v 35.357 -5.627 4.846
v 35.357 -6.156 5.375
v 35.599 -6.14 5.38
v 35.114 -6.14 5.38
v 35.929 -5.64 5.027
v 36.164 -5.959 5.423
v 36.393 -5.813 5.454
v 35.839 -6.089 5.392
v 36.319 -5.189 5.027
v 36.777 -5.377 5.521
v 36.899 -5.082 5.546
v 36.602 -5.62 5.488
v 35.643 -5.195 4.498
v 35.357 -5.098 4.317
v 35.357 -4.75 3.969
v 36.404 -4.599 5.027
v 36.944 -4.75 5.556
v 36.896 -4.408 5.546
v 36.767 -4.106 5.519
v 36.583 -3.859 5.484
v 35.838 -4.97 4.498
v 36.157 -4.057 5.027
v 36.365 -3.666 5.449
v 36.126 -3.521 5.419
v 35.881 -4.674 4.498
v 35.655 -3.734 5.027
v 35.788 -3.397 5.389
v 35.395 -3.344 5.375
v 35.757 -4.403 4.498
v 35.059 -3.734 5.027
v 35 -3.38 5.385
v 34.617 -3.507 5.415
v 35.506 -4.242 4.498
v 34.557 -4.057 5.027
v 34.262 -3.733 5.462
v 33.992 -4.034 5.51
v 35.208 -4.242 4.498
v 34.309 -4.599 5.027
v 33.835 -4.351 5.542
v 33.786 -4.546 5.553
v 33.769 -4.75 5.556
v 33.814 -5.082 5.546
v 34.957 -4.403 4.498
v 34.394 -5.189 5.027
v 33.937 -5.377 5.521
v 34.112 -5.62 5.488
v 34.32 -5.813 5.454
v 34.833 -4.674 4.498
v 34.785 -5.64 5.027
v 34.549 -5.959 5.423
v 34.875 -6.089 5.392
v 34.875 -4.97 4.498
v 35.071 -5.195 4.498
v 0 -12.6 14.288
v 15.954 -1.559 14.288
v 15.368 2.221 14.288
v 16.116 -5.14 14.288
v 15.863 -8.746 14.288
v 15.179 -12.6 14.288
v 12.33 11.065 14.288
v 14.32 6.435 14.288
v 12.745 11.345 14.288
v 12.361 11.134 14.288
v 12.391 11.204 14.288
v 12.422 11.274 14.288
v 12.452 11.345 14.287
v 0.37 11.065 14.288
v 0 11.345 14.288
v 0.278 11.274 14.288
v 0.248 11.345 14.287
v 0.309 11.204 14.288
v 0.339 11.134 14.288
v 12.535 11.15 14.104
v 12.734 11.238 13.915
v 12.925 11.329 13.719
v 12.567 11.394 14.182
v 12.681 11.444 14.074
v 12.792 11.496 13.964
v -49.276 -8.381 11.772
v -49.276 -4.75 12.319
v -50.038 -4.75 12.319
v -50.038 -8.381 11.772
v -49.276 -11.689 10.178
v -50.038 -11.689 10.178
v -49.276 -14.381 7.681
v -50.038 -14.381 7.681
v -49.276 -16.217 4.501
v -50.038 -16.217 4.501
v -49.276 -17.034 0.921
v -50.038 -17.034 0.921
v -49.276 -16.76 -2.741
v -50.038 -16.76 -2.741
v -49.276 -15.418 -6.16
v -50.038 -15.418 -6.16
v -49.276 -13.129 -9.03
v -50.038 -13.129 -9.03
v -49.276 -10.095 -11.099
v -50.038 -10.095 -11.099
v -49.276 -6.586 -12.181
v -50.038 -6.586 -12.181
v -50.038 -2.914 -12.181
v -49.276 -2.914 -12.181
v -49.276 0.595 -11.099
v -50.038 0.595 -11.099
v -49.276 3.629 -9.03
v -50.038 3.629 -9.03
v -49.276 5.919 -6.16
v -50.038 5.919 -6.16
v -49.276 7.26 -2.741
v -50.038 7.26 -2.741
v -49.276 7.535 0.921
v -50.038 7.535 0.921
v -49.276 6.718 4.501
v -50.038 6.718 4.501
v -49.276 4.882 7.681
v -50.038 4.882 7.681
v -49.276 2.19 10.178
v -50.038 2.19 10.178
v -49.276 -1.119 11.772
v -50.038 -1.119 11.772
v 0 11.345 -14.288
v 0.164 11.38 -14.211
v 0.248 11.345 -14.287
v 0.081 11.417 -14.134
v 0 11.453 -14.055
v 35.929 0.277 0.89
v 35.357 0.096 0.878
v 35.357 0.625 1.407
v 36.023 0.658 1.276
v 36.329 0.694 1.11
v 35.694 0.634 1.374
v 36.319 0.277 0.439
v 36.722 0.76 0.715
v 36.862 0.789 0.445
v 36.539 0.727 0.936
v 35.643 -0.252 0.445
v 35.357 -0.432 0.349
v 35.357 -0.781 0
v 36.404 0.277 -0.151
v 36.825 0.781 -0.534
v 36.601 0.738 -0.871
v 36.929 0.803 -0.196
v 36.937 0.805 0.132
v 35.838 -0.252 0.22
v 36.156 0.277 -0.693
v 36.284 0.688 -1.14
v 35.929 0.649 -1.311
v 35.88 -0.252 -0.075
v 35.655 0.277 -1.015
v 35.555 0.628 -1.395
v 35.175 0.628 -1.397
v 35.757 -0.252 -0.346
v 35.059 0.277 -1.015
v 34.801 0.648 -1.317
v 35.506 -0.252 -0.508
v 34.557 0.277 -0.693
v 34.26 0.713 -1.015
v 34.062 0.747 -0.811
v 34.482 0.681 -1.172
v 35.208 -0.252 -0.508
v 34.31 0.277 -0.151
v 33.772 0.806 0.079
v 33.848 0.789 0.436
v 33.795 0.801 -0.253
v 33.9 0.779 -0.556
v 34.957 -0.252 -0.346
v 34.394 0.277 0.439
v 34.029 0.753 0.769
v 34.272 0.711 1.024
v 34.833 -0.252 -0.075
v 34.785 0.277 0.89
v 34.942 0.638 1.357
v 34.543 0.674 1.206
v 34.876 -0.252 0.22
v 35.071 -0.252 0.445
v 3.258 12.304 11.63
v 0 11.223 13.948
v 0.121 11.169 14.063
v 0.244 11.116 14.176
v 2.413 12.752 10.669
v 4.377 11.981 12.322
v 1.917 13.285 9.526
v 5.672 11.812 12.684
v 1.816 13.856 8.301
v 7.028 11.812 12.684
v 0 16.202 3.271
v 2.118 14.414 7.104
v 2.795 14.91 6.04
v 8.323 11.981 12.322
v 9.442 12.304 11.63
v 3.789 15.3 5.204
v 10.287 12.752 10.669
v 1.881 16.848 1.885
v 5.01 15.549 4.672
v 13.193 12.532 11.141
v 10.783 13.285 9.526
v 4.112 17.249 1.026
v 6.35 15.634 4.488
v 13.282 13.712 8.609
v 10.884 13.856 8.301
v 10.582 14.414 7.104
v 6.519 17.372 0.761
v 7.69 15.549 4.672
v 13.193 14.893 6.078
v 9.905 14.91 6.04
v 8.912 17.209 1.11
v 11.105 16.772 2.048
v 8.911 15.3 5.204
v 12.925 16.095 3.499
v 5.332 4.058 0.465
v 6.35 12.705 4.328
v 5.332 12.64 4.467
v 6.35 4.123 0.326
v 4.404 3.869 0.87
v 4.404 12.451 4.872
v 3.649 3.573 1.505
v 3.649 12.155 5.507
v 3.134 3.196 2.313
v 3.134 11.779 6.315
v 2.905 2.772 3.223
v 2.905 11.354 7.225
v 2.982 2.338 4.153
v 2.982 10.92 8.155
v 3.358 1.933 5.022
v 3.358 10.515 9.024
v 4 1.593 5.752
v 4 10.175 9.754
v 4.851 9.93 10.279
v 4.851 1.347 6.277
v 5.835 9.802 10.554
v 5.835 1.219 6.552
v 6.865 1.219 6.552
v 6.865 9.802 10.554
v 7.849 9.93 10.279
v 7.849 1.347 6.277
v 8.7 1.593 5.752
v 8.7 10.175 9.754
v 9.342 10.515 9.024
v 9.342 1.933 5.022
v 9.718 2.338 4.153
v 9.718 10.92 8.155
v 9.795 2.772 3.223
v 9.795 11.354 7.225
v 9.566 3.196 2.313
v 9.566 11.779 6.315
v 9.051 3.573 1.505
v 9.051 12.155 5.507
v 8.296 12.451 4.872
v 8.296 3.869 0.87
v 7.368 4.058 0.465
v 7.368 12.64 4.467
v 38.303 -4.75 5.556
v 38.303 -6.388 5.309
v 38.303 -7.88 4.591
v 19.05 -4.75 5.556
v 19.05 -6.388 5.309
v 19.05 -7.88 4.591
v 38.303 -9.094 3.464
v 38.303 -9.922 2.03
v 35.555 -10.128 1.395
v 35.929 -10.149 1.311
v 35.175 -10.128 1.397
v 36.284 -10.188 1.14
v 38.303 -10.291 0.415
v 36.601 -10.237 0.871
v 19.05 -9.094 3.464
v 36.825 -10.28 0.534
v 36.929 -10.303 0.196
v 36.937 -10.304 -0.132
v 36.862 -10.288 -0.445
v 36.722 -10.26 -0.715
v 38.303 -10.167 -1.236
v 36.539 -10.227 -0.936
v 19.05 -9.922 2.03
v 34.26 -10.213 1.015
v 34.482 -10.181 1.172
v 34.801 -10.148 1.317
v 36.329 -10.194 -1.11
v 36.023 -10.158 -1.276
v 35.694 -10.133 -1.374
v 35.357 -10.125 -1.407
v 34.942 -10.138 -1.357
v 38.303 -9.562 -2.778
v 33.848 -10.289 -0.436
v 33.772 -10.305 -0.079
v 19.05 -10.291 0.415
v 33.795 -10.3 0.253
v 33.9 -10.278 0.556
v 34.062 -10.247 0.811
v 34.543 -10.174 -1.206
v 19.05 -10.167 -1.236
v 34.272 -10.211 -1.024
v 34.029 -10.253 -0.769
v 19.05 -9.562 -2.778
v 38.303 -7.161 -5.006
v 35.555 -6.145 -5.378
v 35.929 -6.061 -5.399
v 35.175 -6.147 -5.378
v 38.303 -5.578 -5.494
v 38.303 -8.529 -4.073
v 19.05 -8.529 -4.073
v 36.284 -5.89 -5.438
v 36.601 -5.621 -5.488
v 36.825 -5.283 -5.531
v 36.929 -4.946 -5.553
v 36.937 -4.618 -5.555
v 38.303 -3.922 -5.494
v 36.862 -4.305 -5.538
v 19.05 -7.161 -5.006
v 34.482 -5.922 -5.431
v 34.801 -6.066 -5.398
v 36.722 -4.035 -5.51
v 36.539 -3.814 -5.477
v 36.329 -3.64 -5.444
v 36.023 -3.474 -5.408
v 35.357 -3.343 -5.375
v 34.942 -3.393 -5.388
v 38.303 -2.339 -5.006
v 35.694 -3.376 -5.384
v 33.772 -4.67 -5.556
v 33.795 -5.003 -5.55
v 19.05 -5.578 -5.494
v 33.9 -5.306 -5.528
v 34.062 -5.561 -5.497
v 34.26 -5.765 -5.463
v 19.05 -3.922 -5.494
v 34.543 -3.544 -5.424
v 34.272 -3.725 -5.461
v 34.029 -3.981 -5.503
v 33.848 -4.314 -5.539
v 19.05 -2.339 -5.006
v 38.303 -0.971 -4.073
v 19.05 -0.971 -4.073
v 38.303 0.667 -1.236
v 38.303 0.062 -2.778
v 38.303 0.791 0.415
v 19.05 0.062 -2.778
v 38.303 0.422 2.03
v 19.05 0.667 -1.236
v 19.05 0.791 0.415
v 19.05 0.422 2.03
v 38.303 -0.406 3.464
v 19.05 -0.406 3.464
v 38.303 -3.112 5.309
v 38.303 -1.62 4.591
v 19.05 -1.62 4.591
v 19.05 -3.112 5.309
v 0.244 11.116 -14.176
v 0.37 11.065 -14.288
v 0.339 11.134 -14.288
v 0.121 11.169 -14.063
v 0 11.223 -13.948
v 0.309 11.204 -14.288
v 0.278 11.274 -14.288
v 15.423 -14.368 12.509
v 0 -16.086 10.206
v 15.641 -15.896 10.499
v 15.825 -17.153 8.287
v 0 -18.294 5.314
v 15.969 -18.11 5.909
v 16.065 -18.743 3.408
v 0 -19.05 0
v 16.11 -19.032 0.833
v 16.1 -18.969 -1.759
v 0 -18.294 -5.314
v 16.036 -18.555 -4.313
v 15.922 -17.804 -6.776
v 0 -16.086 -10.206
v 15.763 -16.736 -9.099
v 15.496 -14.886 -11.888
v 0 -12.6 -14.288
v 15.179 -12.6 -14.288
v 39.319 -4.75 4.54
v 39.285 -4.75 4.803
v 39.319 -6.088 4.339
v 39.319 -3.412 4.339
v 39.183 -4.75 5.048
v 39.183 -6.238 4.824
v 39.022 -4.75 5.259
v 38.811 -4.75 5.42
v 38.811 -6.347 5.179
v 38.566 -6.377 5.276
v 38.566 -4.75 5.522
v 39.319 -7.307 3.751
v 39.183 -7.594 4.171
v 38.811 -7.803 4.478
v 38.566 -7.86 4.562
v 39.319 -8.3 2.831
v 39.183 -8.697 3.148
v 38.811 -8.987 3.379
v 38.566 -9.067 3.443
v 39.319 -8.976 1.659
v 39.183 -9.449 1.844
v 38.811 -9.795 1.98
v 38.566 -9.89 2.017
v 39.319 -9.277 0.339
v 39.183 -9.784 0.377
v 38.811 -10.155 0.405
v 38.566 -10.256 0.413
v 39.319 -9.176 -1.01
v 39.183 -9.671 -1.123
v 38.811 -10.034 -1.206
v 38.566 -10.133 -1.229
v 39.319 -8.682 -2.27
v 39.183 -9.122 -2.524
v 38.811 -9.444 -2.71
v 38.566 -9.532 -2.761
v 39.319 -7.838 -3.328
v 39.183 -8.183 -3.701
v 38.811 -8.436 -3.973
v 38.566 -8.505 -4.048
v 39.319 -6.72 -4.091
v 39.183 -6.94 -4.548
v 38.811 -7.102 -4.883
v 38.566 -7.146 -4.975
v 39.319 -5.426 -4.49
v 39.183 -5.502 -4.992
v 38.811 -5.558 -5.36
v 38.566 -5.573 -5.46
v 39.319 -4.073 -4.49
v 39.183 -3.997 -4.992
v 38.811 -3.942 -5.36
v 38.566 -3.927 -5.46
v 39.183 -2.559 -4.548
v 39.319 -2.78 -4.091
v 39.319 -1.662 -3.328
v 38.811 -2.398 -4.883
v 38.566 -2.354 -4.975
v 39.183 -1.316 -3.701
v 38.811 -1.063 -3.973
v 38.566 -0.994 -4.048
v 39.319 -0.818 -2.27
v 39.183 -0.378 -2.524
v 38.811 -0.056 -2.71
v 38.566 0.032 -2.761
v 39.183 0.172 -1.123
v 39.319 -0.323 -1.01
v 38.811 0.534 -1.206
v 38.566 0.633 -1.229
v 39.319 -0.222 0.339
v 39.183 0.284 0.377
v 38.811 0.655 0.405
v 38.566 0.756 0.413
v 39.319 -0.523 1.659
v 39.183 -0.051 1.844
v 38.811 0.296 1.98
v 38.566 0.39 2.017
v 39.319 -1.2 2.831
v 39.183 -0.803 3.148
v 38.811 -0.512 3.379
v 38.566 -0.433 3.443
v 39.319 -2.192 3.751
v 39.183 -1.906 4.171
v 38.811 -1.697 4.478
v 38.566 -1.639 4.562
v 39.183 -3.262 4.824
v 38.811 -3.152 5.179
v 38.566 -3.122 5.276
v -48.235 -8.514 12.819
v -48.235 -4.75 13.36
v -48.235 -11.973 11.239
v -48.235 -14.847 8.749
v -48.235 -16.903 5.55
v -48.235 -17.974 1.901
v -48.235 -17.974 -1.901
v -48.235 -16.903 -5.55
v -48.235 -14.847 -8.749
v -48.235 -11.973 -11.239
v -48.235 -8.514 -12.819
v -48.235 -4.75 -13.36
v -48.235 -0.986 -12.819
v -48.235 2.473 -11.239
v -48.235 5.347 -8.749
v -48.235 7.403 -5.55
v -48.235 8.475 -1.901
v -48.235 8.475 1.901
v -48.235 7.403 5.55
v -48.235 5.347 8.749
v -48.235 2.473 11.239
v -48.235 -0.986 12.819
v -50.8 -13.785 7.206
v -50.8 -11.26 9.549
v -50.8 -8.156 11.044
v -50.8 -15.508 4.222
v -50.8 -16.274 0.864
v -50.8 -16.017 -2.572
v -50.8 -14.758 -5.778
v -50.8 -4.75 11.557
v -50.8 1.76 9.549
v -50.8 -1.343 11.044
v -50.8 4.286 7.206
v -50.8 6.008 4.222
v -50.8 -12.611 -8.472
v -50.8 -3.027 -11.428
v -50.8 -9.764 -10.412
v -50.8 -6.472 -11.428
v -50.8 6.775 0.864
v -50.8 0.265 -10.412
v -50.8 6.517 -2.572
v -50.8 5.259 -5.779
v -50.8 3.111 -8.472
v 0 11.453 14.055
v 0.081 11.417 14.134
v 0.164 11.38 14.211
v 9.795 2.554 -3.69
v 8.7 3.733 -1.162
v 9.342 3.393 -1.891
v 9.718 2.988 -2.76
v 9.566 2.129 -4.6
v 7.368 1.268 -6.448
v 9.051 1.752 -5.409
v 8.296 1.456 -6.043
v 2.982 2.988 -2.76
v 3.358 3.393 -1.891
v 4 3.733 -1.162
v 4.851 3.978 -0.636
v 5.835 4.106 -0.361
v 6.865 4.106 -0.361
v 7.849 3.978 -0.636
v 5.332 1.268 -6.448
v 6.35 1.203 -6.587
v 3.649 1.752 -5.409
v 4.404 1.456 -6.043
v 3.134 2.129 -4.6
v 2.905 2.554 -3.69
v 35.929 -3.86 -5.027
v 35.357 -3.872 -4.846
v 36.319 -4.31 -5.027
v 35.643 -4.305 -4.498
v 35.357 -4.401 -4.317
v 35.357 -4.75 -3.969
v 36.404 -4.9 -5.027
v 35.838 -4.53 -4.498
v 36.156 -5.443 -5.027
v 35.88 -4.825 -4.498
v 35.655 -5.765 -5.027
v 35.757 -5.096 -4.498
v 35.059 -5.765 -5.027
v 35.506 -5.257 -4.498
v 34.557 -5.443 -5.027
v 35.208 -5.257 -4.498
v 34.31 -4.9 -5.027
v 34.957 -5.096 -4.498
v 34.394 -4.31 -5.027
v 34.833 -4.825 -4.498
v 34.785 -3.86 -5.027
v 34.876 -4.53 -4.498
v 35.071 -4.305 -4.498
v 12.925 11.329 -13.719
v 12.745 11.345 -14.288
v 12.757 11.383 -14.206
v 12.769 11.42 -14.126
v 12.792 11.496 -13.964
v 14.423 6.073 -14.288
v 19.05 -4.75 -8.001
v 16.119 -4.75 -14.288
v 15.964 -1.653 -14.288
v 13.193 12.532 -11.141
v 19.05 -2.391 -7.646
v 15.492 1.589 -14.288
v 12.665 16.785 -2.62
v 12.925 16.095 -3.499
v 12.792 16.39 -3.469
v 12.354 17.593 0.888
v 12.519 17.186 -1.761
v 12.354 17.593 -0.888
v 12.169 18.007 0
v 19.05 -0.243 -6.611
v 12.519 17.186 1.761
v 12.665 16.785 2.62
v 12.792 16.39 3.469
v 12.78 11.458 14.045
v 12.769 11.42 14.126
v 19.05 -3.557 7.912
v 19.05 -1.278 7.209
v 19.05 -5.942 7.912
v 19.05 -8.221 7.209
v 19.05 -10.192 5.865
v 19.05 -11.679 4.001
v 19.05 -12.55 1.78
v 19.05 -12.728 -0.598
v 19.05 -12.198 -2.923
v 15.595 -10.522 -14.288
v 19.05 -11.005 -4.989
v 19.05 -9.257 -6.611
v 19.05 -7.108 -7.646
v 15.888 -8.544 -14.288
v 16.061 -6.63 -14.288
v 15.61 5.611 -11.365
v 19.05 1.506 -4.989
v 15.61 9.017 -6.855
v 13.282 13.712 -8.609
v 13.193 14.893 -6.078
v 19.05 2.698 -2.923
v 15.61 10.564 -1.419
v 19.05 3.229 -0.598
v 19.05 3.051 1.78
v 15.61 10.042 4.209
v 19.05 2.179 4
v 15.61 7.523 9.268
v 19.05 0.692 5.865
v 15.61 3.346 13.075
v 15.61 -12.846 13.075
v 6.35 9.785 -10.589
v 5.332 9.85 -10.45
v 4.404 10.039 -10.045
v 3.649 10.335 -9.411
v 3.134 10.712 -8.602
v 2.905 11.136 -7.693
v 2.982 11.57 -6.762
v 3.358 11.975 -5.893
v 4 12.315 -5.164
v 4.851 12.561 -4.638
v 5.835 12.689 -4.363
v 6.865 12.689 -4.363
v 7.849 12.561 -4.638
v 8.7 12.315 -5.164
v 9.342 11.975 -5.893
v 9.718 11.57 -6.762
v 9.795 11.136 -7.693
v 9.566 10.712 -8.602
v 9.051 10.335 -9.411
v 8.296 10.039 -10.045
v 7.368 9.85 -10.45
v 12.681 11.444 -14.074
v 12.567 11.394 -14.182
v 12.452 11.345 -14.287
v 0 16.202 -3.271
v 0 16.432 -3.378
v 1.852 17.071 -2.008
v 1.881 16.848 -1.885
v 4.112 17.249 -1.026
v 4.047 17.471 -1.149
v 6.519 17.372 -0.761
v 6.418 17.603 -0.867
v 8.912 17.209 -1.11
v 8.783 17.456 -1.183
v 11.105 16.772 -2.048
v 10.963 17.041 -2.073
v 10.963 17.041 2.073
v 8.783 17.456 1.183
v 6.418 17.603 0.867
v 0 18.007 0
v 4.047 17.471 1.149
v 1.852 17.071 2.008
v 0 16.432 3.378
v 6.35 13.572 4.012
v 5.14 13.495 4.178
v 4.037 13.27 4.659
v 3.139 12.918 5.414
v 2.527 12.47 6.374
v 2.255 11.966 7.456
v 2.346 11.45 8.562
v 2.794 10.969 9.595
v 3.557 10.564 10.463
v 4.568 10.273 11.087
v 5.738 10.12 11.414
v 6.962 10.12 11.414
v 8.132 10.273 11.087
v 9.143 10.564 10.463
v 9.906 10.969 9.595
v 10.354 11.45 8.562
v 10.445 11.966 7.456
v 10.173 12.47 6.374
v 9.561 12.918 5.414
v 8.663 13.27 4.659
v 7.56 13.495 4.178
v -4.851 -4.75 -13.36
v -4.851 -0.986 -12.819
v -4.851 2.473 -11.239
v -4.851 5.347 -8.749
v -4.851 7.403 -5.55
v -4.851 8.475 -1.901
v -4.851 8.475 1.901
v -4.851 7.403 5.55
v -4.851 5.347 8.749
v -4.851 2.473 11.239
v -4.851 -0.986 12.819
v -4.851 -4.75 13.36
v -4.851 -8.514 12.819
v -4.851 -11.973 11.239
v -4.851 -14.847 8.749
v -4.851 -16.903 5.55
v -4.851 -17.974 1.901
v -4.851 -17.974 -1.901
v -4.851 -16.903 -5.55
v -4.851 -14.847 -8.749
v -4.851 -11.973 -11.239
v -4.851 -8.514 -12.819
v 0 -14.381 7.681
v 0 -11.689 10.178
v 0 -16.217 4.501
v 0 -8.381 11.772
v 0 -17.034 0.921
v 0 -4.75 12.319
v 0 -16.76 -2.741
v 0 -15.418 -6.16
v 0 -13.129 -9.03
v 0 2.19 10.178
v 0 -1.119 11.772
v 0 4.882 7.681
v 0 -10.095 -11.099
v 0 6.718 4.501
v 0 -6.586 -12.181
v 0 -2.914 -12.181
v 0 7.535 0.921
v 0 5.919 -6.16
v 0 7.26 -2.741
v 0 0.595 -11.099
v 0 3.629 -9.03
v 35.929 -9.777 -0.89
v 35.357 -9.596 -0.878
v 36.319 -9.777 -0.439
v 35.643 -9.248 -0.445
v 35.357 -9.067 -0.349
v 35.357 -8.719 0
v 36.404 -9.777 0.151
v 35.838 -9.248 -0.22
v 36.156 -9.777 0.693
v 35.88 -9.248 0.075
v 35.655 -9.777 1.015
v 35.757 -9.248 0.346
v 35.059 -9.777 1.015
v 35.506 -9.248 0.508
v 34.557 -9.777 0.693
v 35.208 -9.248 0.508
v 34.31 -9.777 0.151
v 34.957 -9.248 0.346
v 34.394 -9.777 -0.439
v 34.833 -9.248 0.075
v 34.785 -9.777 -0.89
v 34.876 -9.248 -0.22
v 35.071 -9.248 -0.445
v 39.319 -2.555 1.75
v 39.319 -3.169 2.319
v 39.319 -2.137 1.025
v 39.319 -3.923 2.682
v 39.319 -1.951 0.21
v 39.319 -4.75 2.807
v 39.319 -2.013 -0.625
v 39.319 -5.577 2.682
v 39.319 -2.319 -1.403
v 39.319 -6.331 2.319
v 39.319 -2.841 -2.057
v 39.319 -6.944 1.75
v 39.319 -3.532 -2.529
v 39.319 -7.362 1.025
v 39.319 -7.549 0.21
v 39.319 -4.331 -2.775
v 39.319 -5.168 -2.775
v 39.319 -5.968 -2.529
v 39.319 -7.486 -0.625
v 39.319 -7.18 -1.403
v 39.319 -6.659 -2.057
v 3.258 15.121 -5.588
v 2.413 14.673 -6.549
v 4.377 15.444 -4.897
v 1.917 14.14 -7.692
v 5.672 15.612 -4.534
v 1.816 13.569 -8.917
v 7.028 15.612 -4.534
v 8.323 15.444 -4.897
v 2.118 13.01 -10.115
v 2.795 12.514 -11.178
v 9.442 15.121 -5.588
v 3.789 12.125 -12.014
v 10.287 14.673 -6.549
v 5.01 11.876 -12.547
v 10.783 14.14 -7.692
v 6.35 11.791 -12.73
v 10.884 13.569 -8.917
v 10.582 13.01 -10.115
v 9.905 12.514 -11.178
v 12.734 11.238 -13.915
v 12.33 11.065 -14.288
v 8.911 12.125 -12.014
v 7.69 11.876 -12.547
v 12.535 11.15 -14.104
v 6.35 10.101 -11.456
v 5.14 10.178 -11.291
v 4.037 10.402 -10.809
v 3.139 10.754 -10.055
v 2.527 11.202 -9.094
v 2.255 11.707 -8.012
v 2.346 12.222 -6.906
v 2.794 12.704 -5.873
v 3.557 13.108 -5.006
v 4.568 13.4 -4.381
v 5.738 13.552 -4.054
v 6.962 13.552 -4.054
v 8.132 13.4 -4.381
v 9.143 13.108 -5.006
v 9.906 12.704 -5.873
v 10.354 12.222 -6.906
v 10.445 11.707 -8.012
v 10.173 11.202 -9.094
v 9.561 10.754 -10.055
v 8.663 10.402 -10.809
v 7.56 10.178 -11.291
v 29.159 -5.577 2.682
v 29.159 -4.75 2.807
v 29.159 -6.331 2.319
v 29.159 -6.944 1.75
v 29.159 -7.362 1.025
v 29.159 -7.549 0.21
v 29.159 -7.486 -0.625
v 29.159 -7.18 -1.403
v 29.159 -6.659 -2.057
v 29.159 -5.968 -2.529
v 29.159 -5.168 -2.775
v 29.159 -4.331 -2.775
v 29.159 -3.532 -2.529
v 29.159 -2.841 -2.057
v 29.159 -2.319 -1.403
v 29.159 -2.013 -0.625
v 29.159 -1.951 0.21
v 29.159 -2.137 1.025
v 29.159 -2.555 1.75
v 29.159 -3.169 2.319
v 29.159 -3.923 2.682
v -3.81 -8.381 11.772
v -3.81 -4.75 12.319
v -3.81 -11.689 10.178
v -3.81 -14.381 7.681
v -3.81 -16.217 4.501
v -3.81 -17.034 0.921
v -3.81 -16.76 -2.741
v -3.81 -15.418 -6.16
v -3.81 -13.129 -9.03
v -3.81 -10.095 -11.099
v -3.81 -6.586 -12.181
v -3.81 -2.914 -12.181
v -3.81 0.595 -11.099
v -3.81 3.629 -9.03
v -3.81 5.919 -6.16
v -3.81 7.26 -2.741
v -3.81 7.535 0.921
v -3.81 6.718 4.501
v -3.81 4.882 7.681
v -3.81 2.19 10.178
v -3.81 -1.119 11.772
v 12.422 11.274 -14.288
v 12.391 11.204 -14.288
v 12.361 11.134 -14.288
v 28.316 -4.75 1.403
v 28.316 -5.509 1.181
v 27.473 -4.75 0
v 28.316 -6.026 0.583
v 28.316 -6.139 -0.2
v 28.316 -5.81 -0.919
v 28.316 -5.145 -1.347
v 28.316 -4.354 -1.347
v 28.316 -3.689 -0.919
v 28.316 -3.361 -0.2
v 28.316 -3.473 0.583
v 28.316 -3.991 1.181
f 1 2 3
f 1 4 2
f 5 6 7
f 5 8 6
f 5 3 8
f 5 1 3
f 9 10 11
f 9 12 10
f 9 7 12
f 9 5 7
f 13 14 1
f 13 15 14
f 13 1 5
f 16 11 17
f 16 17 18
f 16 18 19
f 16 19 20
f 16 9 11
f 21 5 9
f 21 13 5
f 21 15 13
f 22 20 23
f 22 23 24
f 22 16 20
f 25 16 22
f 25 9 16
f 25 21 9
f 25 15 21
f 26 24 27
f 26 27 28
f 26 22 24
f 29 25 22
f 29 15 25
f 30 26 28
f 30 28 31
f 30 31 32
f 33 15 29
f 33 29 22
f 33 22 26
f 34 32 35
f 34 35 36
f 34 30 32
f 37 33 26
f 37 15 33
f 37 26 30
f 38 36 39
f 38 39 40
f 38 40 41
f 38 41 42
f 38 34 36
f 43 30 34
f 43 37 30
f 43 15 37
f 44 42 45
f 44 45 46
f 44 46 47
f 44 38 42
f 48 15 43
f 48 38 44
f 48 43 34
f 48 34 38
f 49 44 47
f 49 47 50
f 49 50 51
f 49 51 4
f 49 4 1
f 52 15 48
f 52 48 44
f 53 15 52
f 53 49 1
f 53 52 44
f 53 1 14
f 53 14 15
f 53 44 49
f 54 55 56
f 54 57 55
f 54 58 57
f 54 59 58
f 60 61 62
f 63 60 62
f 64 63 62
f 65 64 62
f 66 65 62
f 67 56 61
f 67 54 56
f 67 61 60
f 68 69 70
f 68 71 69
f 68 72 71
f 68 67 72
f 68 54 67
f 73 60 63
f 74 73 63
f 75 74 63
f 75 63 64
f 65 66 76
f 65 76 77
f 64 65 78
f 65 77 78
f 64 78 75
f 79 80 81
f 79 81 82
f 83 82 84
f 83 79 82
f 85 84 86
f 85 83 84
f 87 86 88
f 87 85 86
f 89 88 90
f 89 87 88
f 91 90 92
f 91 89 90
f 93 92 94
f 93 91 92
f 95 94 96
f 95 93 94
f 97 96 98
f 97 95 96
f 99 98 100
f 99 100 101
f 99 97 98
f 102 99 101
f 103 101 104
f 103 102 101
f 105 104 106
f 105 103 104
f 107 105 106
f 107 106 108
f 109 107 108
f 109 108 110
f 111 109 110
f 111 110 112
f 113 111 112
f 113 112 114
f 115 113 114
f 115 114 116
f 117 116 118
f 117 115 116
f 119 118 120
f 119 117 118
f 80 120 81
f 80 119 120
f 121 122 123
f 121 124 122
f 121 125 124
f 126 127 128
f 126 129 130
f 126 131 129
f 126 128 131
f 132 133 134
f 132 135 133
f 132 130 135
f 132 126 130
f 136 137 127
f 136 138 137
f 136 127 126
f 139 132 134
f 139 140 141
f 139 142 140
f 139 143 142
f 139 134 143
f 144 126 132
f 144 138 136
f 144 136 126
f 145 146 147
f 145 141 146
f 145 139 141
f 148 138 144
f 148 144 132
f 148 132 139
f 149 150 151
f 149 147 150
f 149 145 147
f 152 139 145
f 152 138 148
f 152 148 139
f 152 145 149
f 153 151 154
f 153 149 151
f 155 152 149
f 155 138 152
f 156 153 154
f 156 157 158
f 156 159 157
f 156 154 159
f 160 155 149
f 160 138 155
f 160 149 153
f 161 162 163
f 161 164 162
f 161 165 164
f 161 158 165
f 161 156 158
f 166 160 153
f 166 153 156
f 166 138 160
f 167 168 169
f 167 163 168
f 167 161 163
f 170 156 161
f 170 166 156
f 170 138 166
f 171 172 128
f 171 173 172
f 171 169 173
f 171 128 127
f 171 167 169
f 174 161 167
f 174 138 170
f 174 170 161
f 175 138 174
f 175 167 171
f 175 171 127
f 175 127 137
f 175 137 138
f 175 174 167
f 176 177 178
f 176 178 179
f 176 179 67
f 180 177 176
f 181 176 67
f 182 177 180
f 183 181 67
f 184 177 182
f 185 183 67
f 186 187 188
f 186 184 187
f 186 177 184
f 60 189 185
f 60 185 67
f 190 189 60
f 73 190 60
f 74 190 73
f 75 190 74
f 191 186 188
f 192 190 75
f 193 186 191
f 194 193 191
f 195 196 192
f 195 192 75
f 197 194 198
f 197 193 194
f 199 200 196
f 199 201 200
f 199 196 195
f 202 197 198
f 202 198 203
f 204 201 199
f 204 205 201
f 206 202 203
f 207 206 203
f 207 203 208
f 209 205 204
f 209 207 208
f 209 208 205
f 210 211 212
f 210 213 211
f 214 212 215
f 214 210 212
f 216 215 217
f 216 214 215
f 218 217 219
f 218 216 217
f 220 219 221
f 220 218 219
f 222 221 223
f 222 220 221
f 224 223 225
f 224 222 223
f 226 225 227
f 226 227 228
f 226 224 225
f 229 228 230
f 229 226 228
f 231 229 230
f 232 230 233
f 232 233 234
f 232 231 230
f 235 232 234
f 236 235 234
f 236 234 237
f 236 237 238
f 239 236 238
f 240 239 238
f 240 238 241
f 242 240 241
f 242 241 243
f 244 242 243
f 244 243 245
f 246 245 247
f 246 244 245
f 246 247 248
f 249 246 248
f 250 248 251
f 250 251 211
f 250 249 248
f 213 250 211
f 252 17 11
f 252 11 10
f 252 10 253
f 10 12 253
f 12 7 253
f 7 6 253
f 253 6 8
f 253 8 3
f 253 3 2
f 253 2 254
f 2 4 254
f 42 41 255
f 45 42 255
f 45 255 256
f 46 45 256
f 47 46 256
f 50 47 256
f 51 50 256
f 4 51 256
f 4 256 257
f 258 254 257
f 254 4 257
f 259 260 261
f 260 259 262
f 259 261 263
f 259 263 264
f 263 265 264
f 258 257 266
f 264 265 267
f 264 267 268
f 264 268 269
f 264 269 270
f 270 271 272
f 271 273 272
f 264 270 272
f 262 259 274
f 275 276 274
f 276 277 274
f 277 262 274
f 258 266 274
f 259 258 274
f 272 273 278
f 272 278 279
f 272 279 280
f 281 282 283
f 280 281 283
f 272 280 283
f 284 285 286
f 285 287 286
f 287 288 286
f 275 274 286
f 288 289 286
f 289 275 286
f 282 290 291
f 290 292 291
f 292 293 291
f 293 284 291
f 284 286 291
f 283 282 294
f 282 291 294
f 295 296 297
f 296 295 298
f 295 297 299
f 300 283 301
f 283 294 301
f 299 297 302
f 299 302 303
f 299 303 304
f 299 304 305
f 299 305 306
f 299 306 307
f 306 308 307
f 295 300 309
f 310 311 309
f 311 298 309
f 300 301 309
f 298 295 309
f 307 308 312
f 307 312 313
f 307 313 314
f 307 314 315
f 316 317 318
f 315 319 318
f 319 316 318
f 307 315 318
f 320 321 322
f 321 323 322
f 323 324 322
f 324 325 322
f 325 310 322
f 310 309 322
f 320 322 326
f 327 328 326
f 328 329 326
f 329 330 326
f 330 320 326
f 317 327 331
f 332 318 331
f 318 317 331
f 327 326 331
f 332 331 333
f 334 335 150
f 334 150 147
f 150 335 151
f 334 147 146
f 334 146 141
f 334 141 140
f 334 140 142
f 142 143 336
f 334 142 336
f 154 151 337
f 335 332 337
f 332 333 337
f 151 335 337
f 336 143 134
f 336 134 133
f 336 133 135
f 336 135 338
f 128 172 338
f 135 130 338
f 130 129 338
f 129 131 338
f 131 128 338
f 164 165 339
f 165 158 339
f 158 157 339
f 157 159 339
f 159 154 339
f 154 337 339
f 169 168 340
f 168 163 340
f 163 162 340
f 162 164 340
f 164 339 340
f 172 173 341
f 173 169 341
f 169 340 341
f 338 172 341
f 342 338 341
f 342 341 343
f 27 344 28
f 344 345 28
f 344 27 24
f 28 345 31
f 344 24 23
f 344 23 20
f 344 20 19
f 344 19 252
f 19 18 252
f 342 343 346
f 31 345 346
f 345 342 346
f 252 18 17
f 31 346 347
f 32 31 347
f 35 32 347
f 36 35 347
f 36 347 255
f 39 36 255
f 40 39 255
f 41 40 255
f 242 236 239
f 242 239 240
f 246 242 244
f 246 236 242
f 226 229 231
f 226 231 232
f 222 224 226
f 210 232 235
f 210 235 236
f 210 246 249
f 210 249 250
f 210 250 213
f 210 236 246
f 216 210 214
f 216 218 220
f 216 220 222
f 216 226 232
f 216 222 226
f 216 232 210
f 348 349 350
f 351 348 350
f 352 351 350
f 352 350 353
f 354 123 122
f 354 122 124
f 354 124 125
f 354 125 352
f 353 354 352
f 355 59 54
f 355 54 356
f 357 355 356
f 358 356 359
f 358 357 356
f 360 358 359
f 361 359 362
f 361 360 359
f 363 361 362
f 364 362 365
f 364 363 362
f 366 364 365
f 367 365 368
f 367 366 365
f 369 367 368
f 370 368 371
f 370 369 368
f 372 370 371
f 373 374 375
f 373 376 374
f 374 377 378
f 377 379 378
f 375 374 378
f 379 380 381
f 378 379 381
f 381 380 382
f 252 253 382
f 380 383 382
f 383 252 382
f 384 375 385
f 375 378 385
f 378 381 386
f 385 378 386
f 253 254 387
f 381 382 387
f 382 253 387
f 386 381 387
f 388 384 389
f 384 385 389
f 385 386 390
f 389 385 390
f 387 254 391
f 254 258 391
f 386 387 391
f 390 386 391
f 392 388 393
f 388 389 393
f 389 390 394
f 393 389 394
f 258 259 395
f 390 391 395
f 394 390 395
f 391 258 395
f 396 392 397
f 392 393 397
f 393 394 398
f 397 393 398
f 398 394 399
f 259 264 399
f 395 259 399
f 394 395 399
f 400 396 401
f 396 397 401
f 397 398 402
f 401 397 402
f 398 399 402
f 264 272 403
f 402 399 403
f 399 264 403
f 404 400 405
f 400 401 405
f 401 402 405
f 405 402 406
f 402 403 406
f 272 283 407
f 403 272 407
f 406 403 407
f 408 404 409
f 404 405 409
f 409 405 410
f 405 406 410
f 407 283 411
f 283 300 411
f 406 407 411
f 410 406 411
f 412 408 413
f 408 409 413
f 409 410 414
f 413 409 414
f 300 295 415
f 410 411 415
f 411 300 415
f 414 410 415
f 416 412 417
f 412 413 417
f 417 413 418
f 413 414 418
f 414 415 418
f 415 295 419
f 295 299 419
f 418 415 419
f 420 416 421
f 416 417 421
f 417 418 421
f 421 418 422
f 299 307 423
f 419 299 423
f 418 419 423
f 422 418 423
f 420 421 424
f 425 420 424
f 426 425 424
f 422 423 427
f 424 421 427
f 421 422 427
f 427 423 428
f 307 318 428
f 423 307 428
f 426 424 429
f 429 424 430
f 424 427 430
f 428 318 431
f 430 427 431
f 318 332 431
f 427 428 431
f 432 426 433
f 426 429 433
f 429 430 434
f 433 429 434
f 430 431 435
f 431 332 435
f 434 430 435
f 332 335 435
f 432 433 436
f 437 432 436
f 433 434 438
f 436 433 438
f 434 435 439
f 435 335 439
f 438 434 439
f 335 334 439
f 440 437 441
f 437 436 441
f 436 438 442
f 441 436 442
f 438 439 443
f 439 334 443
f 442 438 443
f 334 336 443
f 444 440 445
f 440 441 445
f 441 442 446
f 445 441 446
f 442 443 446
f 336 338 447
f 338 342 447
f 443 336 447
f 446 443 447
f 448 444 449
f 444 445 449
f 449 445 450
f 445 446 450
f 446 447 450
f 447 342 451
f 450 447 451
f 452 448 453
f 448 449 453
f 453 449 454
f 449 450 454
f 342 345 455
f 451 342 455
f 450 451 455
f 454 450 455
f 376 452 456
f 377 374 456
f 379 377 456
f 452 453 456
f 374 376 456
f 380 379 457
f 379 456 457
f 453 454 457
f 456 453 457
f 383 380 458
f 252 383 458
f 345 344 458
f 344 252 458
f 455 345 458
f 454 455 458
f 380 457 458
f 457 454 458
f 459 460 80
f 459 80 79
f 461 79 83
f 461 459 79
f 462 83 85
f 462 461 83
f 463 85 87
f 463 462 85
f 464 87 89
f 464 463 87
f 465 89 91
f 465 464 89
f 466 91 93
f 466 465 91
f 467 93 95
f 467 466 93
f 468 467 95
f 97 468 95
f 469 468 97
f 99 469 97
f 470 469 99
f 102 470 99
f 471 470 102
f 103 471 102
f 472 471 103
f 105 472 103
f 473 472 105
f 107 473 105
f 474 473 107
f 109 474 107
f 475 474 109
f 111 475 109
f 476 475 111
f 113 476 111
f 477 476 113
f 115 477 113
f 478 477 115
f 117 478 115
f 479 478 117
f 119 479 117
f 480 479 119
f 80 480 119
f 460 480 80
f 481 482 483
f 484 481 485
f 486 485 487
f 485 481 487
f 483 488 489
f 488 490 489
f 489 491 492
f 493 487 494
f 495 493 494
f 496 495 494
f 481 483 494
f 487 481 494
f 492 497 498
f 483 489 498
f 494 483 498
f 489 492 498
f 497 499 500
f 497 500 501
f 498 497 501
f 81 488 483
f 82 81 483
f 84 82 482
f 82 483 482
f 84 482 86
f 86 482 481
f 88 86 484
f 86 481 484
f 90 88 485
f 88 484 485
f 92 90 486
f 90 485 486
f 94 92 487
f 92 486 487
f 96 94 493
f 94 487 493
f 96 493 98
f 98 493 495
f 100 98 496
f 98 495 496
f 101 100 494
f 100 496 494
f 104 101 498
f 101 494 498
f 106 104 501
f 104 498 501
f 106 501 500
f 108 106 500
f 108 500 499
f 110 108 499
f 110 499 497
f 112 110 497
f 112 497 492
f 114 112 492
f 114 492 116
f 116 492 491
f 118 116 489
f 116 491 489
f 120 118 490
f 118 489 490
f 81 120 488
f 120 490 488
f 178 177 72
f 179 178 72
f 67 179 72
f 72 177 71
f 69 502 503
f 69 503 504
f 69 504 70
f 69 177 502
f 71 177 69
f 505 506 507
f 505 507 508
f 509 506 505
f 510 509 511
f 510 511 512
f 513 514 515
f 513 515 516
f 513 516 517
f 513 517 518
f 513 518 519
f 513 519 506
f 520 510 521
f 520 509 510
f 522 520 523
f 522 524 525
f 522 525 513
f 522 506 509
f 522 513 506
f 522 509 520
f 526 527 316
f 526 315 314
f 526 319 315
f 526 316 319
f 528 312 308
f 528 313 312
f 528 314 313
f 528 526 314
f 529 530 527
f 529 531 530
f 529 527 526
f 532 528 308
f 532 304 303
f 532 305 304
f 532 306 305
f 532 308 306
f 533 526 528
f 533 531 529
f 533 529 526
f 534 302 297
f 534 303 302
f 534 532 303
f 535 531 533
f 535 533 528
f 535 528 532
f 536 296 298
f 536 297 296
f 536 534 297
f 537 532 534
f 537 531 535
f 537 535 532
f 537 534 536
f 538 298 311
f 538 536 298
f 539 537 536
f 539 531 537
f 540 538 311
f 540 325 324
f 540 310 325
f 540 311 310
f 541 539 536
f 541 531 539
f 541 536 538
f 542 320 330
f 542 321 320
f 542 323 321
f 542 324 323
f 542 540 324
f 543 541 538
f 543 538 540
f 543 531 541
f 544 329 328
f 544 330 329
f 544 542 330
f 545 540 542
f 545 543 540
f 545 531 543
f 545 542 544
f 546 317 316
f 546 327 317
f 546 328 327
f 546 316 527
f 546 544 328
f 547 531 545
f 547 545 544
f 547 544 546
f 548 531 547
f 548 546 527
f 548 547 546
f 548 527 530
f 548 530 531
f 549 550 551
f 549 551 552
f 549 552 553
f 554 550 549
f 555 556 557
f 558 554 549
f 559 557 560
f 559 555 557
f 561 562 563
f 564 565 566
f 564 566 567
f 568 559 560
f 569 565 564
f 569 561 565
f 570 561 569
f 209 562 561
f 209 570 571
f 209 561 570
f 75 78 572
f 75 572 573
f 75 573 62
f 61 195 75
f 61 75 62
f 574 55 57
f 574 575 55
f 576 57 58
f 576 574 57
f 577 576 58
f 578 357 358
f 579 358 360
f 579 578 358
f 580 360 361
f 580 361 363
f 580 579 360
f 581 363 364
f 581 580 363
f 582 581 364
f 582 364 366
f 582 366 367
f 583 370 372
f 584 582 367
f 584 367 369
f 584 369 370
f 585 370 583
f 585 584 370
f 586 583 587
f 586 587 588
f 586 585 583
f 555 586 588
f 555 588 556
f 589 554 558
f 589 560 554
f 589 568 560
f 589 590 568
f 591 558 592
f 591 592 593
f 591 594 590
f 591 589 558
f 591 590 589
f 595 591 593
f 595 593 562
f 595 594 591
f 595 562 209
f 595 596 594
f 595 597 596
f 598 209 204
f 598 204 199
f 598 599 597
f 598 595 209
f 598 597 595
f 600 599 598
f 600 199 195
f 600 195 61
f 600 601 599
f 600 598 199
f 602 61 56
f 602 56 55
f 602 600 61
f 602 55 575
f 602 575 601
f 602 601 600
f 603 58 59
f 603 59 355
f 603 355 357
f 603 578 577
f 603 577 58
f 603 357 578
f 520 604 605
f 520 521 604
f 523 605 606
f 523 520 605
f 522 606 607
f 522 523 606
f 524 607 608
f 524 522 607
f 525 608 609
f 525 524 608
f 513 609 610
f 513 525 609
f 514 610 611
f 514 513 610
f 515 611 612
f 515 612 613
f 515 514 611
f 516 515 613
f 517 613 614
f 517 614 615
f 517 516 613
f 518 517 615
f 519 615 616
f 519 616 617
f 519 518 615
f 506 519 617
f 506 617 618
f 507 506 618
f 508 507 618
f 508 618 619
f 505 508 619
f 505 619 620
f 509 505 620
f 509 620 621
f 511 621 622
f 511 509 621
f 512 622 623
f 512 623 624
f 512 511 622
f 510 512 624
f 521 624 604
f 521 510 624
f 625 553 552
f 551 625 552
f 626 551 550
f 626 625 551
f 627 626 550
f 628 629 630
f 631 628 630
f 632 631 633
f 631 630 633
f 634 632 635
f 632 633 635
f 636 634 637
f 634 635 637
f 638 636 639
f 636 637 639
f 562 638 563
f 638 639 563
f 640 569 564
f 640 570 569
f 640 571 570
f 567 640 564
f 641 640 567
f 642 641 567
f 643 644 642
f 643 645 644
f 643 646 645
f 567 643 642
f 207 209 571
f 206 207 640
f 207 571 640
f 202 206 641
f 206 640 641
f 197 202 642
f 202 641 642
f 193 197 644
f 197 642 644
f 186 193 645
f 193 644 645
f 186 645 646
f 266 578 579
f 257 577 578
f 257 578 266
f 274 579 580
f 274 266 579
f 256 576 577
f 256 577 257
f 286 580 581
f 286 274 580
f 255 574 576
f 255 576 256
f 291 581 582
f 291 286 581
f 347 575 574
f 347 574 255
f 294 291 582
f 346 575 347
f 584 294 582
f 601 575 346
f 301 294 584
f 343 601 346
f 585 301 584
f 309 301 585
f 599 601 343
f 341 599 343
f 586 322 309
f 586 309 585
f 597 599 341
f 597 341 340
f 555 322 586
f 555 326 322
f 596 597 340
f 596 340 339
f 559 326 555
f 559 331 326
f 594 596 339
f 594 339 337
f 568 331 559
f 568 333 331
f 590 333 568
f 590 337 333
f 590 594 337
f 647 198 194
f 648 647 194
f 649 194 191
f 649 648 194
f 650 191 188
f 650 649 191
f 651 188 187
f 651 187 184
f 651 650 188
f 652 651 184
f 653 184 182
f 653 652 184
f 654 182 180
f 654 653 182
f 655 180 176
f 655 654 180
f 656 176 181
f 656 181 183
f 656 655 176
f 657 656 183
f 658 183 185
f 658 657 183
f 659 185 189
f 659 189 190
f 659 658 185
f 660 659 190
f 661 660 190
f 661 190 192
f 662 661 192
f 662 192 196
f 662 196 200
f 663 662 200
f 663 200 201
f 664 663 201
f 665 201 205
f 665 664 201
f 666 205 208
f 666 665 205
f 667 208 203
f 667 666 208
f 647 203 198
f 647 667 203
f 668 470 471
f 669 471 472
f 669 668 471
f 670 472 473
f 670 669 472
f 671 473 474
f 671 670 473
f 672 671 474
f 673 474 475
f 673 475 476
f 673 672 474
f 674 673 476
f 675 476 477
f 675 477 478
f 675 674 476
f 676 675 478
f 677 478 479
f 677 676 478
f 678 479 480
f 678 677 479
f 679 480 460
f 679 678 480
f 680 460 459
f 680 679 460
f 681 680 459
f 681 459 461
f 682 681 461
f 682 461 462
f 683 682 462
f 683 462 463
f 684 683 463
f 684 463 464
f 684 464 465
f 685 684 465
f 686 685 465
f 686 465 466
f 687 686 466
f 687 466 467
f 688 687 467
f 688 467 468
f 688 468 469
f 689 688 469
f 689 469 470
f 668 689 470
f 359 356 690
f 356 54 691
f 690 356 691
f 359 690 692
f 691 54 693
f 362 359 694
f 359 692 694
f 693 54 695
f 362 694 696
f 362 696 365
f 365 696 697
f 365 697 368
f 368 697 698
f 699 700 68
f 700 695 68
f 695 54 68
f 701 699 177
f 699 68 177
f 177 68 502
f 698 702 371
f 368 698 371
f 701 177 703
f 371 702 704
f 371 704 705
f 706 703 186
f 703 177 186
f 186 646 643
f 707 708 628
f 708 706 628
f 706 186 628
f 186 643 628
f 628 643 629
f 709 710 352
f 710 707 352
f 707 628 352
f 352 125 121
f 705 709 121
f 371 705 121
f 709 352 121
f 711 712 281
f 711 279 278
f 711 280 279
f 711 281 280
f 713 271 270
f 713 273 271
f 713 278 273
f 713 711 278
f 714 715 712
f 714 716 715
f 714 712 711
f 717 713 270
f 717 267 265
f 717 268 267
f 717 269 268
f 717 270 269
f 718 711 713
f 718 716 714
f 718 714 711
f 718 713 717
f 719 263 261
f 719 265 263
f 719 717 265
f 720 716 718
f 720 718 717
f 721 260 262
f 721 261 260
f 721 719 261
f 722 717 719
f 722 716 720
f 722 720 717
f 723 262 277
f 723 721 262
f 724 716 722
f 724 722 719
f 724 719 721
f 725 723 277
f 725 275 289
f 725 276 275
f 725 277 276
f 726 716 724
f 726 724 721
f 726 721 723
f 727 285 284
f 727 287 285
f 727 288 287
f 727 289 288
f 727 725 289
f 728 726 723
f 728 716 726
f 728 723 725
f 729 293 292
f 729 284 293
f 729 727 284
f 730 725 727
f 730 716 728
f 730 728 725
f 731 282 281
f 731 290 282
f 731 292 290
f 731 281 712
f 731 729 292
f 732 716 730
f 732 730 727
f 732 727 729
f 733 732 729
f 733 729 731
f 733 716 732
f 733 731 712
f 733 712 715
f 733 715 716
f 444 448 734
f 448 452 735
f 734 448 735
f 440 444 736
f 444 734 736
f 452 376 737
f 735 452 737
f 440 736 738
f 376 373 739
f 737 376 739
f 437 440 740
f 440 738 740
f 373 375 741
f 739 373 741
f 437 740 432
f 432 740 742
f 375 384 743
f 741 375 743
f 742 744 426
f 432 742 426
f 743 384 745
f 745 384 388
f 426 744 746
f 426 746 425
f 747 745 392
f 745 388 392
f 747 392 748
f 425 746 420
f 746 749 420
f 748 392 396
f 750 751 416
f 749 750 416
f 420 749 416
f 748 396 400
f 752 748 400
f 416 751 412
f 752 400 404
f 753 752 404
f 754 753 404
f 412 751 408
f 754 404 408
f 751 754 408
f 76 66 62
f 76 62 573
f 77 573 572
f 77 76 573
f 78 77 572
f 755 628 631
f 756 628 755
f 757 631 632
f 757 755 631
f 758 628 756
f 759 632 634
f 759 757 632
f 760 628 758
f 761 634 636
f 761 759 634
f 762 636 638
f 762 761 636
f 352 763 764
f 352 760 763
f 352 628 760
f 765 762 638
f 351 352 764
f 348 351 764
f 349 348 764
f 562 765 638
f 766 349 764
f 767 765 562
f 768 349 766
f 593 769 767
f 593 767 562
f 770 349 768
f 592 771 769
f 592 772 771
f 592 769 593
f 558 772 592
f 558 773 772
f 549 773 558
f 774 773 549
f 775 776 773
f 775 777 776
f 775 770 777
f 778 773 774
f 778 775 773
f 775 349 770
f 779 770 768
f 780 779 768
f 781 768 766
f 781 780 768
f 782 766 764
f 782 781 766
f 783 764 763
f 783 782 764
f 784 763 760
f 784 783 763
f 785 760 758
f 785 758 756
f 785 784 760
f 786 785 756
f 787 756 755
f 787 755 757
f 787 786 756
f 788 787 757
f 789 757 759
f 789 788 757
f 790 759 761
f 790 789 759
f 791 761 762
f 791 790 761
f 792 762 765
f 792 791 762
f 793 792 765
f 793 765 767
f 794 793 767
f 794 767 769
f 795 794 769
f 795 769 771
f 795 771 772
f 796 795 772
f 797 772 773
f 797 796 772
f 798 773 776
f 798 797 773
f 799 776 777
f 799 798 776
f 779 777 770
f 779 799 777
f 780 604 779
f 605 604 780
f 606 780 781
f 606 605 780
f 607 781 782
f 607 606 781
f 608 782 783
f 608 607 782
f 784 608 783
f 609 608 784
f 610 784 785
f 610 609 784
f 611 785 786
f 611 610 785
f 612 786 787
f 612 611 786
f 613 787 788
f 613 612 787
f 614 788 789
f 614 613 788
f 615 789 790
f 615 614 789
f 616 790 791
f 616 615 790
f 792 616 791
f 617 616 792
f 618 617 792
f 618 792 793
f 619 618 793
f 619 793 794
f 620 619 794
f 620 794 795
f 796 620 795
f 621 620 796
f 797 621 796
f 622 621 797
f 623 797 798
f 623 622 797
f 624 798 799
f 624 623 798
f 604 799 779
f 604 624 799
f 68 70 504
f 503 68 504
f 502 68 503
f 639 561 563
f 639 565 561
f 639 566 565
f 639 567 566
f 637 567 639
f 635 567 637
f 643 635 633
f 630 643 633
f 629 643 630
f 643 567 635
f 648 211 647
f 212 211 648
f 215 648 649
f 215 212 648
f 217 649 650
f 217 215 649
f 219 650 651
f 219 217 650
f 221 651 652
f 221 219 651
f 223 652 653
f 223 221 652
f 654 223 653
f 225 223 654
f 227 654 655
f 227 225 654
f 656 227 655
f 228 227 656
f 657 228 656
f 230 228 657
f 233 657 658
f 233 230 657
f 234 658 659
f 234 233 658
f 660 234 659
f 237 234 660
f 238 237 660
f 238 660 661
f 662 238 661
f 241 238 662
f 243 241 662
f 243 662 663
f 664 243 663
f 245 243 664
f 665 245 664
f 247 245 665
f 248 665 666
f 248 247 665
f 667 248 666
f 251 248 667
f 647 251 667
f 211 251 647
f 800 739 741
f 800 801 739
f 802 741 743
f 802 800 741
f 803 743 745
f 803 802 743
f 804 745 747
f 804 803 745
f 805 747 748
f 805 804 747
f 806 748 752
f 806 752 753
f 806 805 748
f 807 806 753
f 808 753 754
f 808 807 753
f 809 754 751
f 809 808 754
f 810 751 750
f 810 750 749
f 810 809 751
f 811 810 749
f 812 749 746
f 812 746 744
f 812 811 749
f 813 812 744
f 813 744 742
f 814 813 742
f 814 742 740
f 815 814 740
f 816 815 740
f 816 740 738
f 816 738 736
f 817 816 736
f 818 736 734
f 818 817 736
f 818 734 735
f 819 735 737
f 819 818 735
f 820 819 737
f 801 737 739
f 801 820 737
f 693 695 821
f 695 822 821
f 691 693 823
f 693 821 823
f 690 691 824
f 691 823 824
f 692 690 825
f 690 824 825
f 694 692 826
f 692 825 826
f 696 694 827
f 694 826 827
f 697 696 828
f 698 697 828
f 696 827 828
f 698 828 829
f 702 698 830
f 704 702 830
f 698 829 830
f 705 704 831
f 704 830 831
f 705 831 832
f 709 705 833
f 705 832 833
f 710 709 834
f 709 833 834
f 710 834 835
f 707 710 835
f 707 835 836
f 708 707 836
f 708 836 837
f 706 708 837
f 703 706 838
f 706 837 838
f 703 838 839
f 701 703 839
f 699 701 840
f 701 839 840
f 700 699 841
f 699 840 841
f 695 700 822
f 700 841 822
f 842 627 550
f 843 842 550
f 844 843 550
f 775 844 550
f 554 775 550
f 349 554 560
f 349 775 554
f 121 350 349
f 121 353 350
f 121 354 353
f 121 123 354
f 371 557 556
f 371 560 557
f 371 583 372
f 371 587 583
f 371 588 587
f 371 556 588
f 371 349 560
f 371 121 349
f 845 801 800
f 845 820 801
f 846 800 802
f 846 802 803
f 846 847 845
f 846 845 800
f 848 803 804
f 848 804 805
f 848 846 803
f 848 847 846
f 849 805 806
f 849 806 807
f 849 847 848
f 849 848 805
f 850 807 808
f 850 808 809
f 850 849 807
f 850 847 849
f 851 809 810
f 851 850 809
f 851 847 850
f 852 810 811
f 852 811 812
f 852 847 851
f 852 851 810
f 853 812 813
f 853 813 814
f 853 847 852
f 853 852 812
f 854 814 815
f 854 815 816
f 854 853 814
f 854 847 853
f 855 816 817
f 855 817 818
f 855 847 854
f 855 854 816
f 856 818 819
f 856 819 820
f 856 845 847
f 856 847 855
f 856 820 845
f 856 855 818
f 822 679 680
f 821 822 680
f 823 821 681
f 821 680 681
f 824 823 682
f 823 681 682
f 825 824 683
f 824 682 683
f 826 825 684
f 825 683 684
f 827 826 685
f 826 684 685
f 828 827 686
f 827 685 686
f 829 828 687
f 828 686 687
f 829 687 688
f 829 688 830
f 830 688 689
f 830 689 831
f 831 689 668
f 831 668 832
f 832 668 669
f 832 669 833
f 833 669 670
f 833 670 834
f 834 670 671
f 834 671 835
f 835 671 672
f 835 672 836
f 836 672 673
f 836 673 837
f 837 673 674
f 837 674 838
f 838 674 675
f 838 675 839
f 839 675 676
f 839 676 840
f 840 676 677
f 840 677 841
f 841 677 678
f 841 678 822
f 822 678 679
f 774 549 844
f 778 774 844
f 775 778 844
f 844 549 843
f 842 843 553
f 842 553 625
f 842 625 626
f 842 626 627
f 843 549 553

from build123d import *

# Parameters (mm, degrees)
SKETCH1_R           = 19.05
EXTRUDE1_DEPTH      = 19.05
EXTRUDE1_DEPTH_BACK = 50.8
CUT_EXTRUDE1_REACH  = 52.8
SKETCH2_R           = 19.05
SKETCH2_R_2         = 13.3604
CUT_EXTRUDE3_REACH  = 21.05
SKETCH19_R          = 8.6614
CUT_EXTRUDE4_DEPTH  = 0.254
SKETCH20_R          = 8.6614
CUT_EXTRUDE5_DEPTH  = 0.254
CHAMFER1_SIZE       = 0.762
CIRPATTERN1_COUNT   = 4


with BuildPart() as part:
    # Sketch1 → Extrude1 (new body, two sides)
    with BuildSketch(Plane(origin=(0, 0, 0), x_dir=(0, 0, -1), z_dir=(1, 0, 0))) as extrude1_sk:
        Circle(SKETCH1_R)
    extrude(amount=EXTRUDE1_DEPTH)
    extrude(extrude1_sk.sketch, amount=-EXTRUDE1_DEPTH_BACK)

    # Sketch2 → Cut-Extrude1 (cut, up to next)
    with BuildSketch(Plane(origin=(0, 0, 0), x_dir=(0, 0, -1), z_dir=(1, 0, 0)), mode=Mode.PRIVATE) as cut_extrude1_sk1:
        Circle(SKETCH2_R)
        with Locations((0, -4.7498)):
            Circle(SKETCH2_R_2, mode=Mode.SUBTRACT)
    cut_extrude1_tool1 = extrude(cut_extrude1_sk1.sketch, amount=-CUT_EXTRUDE1_REACH, mode=Mode.PRIVATE) & part.part
    add(cut_extrude1_tool1.solids().sort_by_distance((0, 0, 18.511185))[0], mode=Mode.SUBTRACT)

    # Sketch4 → Cut-Extrude3 (cut, up to next)
    with BuildSketch(Plane.ZY, mode=Mode.PRIVATE) as cut_extrude3_sk1:
        with BuildLine():
            Line((14.2875, -12.600390619), (14.2875, 11.344778237))
            Line((14.2875, 11.344778237), (0, 18.007148903))
            Line((0, 18.007148903), (-14.2875, 11.344778237))
            Line((-14.2875, 11.344778237), (-14.2875, -12.600390619))
            ThreePointArc((-14.2875, -12.600390619), (0, 19.05), (14.2875, -12.600390619))
        make_face()
    cut_extrude3_tool1 = extrude(cut_extrude3_sk1.sketch, amount=-CUT_EXTRUDE3_REACH, mode=Mode.PRIVATE) & part.part
    add(cut_extrude3_tool1.solids().sort_by_distance((0, -0.627806, 14.782814))[0], mode=Mode.SUBTRACT)

    # Sketch6 → Cut-Revolve2 (revolve, cut)
    with BuildSketch(Plane.XY, mode=Mode.PRIVATE) as cut_revolve2_sk:
        Polygon((12.169188023, 18.007148903), (19.05, 3.2512), (19.05, 18.007148903), align=None)
    revolve(cut_revolve2_sk.sketch.rotate(Axis((1.987224567, -4.7498, 0), (1, 0, 0)), 270), axis=Axis((1.987224567, -4.7498, 0), (1, 0, 0)), mode=Mode.SUBTRACT)  # turned: the seam where the file's is

    # S2D0002 → Cut-Revolve3 (revolve, cut)
    with BuildSketch(Plane(origin=(6.35, 13.712414668, 8.609072086), x_dir=(0, 0.422618262, -0.906307787), z_dir=(1, 0, 0))):
        Polygon((0, 0), (4.5466, 0), (4.106586662, -2.0701), (3.4544, -2.722286662), (3.4544, -12.192), (0, -12.192), align=None)
    revolve(axis=Axis((6.35, 2.110224902, 3.198882147), (0, 0.906307787, 0.422618262)), mode=Mode.SUBTRACT)

    # Sketch19 → Cut-Extrude4 (cut)
    with BuildSketch(Plane(origin=(0, 14.790960552, 6.897138177), x_dir=(1, 0, 0), z_dir=(0, 0.906307787, 0.422618262))):
        with Locations((6.35, -2.00735222)):
            Circle(SKETCH19_R)
    extrude(amount=-CUT_EXTRUDE4_DEPTH, mode=Mode.SUBTRACT)

    # Sketch8 → Cut-Revolve4 (revolve, cut)
    with BuildSketch(Plane(origin=(6.35, 13.712414668, -8.609072086), x_dir=(0, -0.422618262, -0.906307787), z_dir=(1, 0, 0))):
        Polygon((0, 0), (4.5466, 0), (4.106586662, -2.0701), (3.4544, -2.722286662), (3.4544, -12.192), (0, -12.192), align=None)
    revolve(axis=Axis((6.35, 2.110224902, -3.198882147), (0, 0.906307787, -0.422618262)), mode=Mode.SUBTRACT)

    # Sketch20 → Cut-Extrude5 (cut)
    with BuildSketch(Plane(origin=(0, 14.790960552, -6.897138177), x_dir=(1, 0, 0), z_dir=(0, 0.906307787, -0.422618262))):
        with Locations((6.35, 2.00735222)):
            Circle(SKETCH20_R)
    extrude(amount=-CUT_EXTRUDE5_DEPTH, mode=Mode.SUBTRACT)

    # Sketch10 → Cut-Revolve6 (revolve, cut)
    with BuildSketch(Plane.XY, mode=Mode.PRIVATE) as cut_revolve6_sk:
        Polygon((0, 8.6106), (0, 7.5692), (-3.81, 7.5692), (-4.8514, 8.6106), align=None)
    revolve(cut_revolve6_sk.sketch.rotate(Axis((-5.09397, -4.7498, 0), (1, 0, 0)), 90), axis=Axis((-5.09397, -4.7498, 0), (1, 0, 0)), mode=Mode.SUBTRACT)  # turned: the seam where the file's is

    # Sketch12 → Cut-Revolve8 (revolve, cut)
    with BuildSketch(Plane.XY, mode=Mode.PRIVATE) as cut_revolve8_sk:
        Polygon((-50.8, 8.6106), (-50.8, 7.5692), (-49.276, 7.5692), (-48.2346, 8.6106), align=None)
    revolve(cut_revolve8_sk.sketch.rotate(Axis((-50.92827, -4.7498, 0), (1, 0, 0)), 90), axis=Axis((-50.92827, -4.7498, 0), (1, 0, 0)), mode=Mode.SUBTRACT)  # turned: the seam where the file's is

    # Chamfer1
    chamfer1_edges = [part.edges().sort_by_distance(p)[0] for p in [
        (-50.8, -4.7498, -12.319),
    ]]
    chamfer(chamfer1_edges, length=CHAMFER1_SIZE)

    # Sketch13 → Revolve1 (revolve)
    with BuildSketch(Plane(origin=(0, 0, 0), x_dir=(0, -1, 0), z_dir=(0, 0, 1)), mode=Mode.PRIVATE) as revolve1_sk:
        with BuildLine():
            Line((4.7498, 19.05), (4.7498, 39.3192))
            Line((4.7498, 39.3192), (9.29005, 39.3192))
            ThreePointArc((9.29005, 39.3192), (10.00847049, 39.02162049), (10.30605, 38.3032))
            Line((10.30605, 38.3032), (10.30605, 19.05))
            Line((10.30605, 19.05), (4.7498, 19.05))
        make_face()
    revolve(revolve1_sk.sketch.rotate(Axis((18.03654, -4.7498, 0), (1, 0, 0)), 270), axis=Axis((18.03654, -4.7498, 0), (1, 0, 0)))  # turned: the seam where the file's is

    # S2D0001 → Cut-Revolve9 (revolve, cut)
    with BuildSketch(Plane(origin=(39.3192, -7.5565, 0), x_dir=(0, -1, 0), z_dir=(0, 0, 1)), mode=Mode.PRIVATE) as cut_revolve9_sk:
        Polygon((0, 0), (0, -10.16), (-2.8067, -11.846435499), (-2.8067, 0), align=None)
    revolve(cut_revolve9_sk.sketch.rotate(Axis((26.880442726, -4.7498, 0), (1, 0, 0)), 270), axis=Axis((26.880442726, -4.7498, 0), (1, 0, 0)), mode=Mode.SUBTRACT)  # turned: the seam where the file's is

    # Sketch16 → Cut-Revolve10 (revolve, cut)
    with BuildSketch(Plane(origin=(35.3568, 2.197634211, 0), x_dir=(-1, 0, 0), z_dir=(0, 0, -1)), mode=Mode.PRIVATE) as cut_revolve10_sk:
        Polygon((0, -1.391184211), (1.5875, -1.391184211), (0, -2.978684211), align=None)
    cut_revolve10 = revolve(cut_revolve10_sk.sketch.rotate(Axis((35.3568, -1.281162177, 0), (0, 1, 0)), 90), axis=Axis((35.3568, -1.281162177, 0), (0, 1, 0)), mode=Mode.SUBTRACT)  # turned: the seam where the file's is

    # CirPattern1: Cut-Revolve10 ×4 about axis
    cirpattern1_axis = Axis((18.03654, -4.7498, 0), (-1, 0, 0))
    for i in range(1, CIRPATTERN1_COUNT):
        add(cut_revolve10.rotate(cirpattern1_axis, i * 360 / CIRPATTERN1_COUNT), mode=Mode.SUBTRACT)


solid = part.part
